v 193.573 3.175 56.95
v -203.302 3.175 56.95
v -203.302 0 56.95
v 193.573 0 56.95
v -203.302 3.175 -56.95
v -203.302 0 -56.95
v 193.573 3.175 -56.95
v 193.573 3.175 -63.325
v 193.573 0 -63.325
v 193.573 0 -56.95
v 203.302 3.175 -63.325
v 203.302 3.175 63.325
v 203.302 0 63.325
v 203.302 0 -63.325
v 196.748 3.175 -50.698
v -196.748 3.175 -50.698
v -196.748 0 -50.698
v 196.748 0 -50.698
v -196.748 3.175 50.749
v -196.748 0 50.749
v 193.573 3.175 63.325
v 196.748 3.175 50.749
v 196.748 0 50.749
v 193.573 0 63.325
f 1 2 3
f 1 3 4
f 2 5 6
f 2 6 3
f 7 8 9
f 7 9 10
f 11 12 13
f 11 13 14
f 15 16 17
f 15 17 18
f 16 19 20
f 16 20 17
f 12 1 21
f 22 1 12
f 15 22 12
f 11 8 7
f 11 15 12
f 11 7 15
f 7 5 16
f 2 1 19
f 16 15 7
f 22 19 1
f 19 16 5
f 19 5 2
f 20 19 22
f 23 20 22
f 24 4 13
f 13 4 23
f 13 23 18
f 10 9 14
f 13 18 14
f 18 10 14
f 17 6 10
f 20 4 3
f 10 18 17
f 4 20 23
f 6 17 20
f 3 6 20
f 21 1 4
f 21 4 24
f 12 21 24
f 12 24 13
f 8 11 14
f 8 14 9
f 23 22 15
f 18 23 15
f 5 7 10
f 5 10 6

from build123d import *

# Parameters (mm, degrees)
SKETCH1_W           = 393.7
SKETCH1_H           = 101.6508
BOSS_EXTRUDE1_DEPTH = 3.175
SKETCH2_W           = 393.4968
SKETCH2_H           = 101.4476
BOSS_EXTRUDE2_DEPTH = 3.175


with BuildPart() as part:
    # Sketch1 → Boss-Extrude1 (new body)
    with BuildSketch(Plane(origin=(0, 0, 0), x_dir=(1, 0, 0), z_dir=(0, 1, 0))):
        Polygon((193.675, -56.848375), (193.675, -63.223775), (203.2, -63.223775), (203.2, 63.223775), (193.675, 63.223775), (193.675, 56.848375), (-203.2, 56.848375), (-203.2, -56.848375), align=None)
        with Locations((0, -0.0254)):
            Rectangle(SKETCH1_W, SKETCH1_H, mode=Mode.SUBTRACT)
    extrude(amount=BOSS_EXTRUDE1_DEPTH)

    # Sketch2 → Boss-Extrude2 (add)
    with BuildSketch(Plane(origin=(0, 3.175, 0), x_dir=(1, 0, 0), z_dir=(0, 1, 0))):
        Polygon((193.5734, -56.949975), (193.5734, -63.325375), (203.3016, -63.325375), (203.3016, 63.325375), (193.5734, 63.325375), (193.5734, 56.949975), (-203.3016, 56.949975), (-203.3016, -56.949975), align=None)
        with Locations((0, -0.0254)):
            Rectangle(SKETCH2_W, SKETCH2_H, mode=Mode.SUBTRACT)
    extrude(amount=-BOSS_EXTRUDE2_DEPTH)


solid = part.part
